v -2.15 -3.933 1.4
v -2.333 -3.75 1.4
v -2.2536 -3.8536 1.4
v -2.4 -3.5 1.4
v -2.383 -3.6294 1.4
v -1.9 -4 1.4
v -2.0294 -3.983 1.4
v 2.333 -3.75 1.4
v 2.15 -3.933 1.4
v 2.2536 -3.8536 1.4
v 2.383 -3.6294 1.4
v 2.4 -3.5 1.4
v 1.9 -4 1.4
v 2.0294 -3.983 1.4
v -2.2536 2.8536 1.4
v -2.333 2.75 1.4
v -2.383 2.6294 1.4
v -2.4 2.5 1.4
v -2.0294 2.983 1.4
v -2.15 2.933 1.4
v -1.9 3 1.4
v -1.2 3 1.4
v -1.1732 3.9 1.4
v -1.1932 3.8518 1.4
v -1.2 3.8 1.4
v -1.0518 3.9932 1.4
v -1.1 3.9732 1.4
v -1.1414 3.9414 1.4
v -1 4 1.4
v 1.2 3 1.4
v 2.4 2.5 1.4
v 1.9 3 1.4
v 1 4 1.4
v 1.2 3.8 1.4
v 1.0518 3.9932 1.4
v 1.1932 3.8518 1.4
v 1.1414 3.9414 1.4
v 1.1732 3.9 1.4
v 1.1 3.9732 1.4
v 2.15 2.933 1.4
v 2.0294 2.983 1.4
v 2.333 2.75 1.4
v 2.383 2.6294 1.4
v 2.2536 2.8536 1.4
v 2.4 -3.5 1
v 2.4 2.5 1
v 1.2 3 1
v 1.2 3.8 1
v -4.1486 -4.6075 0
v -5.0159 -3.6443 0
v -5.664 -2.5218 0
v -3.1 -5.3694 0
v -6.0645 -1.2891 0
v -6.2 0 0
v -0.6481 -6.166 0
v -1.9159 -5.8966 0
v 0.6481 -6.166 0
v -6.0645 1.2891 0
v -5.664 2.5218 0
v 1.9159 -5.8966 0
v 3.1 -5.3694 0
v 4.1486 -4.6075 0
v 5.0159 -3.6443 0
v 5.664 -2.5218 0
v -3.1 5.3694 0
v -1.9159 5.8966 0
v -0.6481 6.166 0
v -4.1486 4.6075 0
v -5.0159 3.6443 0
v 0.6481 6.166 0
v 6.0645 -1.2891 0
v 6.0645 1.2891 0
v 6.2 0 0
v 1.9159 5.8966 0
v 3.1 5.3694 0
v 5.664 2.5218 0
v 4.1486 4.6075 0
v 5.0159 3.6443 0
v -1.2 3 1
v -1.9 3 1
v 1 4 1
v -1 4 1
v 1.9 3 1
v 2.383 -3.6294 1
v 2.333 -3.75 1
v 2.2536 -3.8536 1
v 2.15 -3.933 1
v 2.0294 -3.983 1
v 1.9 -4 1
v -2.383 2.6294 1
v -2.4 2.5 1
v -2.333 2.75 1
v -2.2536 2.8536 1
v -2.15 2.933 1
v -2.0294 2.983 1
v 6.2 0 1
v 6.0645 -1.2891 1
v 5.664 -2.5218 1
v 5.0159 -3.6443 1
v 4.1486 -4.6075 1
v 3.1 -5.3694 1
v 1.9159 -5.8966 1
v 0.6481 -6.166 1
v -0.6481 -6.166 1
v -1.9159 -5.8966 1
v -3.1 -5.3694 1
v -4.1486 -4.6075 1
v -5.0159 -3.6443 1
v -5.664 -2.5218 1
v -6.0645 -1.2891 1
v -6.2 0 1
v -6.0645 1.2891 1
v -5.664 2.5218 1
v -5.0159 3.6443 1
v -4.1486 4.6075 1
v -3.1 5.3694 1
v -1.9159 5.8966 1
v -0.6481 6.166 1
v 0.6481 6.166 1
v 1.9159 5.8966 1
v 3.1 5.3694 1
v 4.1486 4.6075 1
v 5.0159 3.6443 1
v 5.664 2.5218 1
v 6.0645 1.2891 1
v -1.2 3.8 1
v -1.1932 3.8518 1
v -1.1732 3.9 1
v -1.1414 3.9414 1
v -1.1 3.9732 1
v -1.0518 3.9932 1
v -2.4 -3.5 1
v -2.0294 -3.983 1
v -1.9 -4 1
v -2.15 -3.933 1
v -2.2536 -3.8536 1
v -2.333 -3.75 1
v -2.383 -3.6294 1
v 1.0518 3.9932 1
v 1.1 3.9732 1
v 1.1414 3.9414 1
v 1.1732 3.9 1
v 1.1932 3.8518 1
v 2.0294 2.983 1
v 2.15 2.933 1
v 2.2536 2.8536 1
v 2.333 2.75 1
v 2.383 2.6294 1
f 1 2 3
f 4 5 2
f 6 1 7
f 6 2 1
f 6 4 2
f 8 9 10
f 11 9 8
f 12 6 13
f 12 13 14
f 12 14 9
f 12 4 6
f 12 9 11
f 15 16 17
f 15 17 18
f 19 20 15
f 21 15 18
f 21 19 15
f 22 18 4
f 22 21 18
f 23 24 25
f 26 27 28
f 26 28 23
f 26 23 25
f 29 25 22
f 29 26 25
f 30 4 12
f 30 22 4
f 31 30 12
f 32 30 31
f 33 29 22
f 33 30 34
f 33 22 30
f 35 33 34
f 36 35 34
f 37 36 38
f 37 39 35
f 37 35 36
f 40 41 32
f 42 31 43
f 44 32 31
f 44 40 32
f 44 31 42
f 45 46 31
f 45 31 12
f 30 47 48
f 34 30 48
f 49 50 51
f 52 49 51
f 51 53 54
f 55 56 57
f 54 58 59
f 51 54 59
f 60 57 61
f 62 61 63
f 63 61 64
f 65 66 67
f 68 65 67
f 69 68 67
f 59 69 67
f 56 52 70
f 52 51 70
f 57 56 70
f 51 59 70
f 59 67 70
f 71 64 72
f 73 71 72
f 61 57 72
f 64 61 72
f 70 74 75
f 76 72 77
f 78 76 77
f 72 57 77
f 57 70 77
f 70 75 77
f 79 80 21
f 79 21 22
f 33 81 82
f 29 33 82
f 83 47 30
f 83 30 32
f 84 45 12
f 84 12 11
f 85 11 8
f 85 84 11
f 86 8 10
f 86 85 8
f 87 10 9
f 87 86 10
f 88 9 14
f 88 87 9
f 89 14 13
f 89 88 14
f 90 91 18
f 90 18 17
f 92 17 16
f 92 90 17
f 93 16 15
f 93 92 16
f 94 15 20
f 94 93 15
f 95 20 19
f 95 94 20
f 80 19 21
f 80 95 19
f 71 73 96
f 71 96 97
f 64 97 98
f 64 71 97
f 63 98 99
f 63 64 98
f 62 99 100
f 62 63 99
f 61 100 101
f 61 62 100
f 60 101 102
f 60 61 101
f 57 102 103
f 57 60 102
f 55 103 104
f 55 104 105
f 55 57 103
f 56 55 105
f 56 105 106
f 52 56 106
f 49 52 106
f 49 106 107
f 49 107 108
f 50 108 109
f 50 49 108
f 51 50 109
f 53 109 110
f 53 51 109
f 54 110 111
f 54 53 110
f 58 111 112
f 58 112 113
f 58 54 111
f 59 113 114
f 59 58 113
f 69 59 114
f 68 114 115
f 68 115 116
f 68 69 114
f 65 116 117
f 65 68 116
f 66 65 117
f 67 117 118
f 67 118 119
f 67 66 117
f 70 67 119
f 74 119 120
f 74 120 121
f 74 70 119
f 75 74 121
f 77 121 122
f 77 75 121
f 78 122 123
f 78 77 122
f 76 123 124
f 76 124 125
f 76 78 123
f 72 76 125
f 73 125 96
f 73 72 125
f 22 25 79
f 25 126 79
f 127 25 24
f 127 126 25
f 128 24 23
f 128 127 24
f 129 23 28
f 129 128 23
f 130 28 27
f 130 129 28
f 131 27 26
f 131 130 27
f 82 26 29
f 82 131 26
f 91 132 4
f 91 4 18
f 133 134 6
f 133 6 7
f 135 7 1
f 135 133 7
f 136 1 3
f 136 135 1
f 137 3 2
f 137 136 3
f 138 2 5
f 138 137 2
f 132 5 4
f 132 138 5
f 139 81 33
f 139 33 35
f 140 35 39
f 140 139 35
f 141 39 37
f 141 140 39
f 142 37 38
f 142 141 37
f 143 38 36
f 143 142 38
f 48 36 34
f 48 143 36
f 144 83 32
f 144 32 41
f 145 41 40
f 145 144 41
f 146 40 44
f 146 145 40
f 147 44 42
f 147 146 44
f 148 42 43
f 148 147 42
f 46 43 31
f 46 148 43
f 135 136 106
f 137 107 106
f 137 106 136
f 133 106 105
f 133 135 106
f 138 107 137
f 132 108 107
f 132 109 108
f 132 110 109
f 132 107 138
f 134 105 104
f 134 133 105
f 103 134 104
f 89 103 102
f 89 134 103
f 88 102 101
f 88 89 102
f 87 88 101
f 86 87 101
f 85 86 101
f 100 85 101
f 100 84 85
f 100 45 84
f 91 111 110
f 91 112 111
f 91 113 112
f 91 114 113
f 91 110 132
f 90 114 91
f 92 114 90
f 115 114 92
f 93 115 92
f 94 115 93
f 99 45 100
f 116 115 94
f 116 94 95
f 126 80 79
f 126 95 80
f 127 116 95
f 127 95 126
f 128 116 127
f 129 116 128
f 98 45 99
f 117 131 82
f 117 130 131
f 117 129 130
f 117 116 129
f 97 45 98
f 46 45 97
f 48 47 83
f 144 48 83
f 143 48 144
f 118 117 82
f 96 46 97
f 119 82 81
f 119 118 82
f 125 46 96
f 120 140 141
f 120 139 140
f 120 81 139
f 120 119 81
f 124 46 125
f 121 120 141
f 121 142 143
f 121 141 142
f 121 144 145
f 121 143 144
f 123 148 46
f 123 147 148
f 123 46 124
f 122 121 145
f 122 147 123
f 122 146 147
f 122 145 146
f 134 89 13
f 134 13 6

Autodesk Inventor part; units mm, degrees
ref_plane "YZ Plane" through (0, 0, 0) normal (1, 0, 0) x (0, 1, 0)
ref_plane "XZ Plane" through (0, 0, 0) normal (0, 1, 0) x (-1, 0, 0)
ref_plane "XY Plane" through (0, 0, 0) normal (0, 0, 1) x (1, 0, 0)
sketch "Náčrt1" plane through (0, 0, 0) normal (0, 0, 1) x (1, 0, 0)
  line L0 (0, 8.68) -> (0, -8.68) projected
  line L1 (-8.68, 0) -> (8.68, 0) projected
  circle A0 centre (0, 0) radius 6.2
  dimension "d0" = 12.4
extrude "Vysunutí1" add sketch "Náčrt1" along normal blind 1
sketch "Náčrt2" plane through (0, 0, 1) normal (0, 0, 1) x (1, 0, 0)
  line L0 (-8.68, 0) -> (8.68, 0) projected
  line L1 (0, 8.68) -> (0, -8.68) projected
  line L2 (-1.9, 3) -> (1.9, 3)
  line L3 (2.4, 2.5) -> (2.4, -3.5)
  line L4 (1.9, -4) -> (-1.9, -4)
  line L5 (-2.4, -3.5) -> (-2.4, 2.5)
  line L6 (-1.2, 3) -> (1.2, 3)
  line L7 (1.2, 3) -> (1.2, 3.8)
  line L8 (1, 4) -> (-1, 4)
  line L9 (-1.2, 3.8) -> (-1.2, 3)
  arc A0 (-1.9, 3) -> (-2.4, 2.5) centre (-1.9, 2.5) ccw
  arc A1 (2.4, 2.5) -> (1.9, 3) centre (1.9, 2.5) ccw
  arc A2 (-2.4, -3.5) -> (-1.9, -4) centre (-1.9, -3.5) ccw
  arc A3 (1.9, -4) -> (2.4, -3.5) centre (1.9, -3.5) ccw
  arc A4 (-1, 4) -> (-1.2, 3.8) centre (-1, 3.8) ccw
  arc A5 (1.2, 3.8) -> (1, 4) centre (1, 3.8) ccw
  point P0 (0, 0)
  dimension "d3" = 2.4
  dimension "d4" = 2.4
  dimension "d5" = 4
  dimension "d6" = 3
  dimension "d7" = 1.2
  dimension "d8" = 1.2
  dimension "d9" = 1
  dimension "d10" = 0.5
  dimension "d11" = 0.2
extrude "Vysunutí2" add sketch "Náčrt2" along normal blind 0.4
properties part number "button_plate_battery"
